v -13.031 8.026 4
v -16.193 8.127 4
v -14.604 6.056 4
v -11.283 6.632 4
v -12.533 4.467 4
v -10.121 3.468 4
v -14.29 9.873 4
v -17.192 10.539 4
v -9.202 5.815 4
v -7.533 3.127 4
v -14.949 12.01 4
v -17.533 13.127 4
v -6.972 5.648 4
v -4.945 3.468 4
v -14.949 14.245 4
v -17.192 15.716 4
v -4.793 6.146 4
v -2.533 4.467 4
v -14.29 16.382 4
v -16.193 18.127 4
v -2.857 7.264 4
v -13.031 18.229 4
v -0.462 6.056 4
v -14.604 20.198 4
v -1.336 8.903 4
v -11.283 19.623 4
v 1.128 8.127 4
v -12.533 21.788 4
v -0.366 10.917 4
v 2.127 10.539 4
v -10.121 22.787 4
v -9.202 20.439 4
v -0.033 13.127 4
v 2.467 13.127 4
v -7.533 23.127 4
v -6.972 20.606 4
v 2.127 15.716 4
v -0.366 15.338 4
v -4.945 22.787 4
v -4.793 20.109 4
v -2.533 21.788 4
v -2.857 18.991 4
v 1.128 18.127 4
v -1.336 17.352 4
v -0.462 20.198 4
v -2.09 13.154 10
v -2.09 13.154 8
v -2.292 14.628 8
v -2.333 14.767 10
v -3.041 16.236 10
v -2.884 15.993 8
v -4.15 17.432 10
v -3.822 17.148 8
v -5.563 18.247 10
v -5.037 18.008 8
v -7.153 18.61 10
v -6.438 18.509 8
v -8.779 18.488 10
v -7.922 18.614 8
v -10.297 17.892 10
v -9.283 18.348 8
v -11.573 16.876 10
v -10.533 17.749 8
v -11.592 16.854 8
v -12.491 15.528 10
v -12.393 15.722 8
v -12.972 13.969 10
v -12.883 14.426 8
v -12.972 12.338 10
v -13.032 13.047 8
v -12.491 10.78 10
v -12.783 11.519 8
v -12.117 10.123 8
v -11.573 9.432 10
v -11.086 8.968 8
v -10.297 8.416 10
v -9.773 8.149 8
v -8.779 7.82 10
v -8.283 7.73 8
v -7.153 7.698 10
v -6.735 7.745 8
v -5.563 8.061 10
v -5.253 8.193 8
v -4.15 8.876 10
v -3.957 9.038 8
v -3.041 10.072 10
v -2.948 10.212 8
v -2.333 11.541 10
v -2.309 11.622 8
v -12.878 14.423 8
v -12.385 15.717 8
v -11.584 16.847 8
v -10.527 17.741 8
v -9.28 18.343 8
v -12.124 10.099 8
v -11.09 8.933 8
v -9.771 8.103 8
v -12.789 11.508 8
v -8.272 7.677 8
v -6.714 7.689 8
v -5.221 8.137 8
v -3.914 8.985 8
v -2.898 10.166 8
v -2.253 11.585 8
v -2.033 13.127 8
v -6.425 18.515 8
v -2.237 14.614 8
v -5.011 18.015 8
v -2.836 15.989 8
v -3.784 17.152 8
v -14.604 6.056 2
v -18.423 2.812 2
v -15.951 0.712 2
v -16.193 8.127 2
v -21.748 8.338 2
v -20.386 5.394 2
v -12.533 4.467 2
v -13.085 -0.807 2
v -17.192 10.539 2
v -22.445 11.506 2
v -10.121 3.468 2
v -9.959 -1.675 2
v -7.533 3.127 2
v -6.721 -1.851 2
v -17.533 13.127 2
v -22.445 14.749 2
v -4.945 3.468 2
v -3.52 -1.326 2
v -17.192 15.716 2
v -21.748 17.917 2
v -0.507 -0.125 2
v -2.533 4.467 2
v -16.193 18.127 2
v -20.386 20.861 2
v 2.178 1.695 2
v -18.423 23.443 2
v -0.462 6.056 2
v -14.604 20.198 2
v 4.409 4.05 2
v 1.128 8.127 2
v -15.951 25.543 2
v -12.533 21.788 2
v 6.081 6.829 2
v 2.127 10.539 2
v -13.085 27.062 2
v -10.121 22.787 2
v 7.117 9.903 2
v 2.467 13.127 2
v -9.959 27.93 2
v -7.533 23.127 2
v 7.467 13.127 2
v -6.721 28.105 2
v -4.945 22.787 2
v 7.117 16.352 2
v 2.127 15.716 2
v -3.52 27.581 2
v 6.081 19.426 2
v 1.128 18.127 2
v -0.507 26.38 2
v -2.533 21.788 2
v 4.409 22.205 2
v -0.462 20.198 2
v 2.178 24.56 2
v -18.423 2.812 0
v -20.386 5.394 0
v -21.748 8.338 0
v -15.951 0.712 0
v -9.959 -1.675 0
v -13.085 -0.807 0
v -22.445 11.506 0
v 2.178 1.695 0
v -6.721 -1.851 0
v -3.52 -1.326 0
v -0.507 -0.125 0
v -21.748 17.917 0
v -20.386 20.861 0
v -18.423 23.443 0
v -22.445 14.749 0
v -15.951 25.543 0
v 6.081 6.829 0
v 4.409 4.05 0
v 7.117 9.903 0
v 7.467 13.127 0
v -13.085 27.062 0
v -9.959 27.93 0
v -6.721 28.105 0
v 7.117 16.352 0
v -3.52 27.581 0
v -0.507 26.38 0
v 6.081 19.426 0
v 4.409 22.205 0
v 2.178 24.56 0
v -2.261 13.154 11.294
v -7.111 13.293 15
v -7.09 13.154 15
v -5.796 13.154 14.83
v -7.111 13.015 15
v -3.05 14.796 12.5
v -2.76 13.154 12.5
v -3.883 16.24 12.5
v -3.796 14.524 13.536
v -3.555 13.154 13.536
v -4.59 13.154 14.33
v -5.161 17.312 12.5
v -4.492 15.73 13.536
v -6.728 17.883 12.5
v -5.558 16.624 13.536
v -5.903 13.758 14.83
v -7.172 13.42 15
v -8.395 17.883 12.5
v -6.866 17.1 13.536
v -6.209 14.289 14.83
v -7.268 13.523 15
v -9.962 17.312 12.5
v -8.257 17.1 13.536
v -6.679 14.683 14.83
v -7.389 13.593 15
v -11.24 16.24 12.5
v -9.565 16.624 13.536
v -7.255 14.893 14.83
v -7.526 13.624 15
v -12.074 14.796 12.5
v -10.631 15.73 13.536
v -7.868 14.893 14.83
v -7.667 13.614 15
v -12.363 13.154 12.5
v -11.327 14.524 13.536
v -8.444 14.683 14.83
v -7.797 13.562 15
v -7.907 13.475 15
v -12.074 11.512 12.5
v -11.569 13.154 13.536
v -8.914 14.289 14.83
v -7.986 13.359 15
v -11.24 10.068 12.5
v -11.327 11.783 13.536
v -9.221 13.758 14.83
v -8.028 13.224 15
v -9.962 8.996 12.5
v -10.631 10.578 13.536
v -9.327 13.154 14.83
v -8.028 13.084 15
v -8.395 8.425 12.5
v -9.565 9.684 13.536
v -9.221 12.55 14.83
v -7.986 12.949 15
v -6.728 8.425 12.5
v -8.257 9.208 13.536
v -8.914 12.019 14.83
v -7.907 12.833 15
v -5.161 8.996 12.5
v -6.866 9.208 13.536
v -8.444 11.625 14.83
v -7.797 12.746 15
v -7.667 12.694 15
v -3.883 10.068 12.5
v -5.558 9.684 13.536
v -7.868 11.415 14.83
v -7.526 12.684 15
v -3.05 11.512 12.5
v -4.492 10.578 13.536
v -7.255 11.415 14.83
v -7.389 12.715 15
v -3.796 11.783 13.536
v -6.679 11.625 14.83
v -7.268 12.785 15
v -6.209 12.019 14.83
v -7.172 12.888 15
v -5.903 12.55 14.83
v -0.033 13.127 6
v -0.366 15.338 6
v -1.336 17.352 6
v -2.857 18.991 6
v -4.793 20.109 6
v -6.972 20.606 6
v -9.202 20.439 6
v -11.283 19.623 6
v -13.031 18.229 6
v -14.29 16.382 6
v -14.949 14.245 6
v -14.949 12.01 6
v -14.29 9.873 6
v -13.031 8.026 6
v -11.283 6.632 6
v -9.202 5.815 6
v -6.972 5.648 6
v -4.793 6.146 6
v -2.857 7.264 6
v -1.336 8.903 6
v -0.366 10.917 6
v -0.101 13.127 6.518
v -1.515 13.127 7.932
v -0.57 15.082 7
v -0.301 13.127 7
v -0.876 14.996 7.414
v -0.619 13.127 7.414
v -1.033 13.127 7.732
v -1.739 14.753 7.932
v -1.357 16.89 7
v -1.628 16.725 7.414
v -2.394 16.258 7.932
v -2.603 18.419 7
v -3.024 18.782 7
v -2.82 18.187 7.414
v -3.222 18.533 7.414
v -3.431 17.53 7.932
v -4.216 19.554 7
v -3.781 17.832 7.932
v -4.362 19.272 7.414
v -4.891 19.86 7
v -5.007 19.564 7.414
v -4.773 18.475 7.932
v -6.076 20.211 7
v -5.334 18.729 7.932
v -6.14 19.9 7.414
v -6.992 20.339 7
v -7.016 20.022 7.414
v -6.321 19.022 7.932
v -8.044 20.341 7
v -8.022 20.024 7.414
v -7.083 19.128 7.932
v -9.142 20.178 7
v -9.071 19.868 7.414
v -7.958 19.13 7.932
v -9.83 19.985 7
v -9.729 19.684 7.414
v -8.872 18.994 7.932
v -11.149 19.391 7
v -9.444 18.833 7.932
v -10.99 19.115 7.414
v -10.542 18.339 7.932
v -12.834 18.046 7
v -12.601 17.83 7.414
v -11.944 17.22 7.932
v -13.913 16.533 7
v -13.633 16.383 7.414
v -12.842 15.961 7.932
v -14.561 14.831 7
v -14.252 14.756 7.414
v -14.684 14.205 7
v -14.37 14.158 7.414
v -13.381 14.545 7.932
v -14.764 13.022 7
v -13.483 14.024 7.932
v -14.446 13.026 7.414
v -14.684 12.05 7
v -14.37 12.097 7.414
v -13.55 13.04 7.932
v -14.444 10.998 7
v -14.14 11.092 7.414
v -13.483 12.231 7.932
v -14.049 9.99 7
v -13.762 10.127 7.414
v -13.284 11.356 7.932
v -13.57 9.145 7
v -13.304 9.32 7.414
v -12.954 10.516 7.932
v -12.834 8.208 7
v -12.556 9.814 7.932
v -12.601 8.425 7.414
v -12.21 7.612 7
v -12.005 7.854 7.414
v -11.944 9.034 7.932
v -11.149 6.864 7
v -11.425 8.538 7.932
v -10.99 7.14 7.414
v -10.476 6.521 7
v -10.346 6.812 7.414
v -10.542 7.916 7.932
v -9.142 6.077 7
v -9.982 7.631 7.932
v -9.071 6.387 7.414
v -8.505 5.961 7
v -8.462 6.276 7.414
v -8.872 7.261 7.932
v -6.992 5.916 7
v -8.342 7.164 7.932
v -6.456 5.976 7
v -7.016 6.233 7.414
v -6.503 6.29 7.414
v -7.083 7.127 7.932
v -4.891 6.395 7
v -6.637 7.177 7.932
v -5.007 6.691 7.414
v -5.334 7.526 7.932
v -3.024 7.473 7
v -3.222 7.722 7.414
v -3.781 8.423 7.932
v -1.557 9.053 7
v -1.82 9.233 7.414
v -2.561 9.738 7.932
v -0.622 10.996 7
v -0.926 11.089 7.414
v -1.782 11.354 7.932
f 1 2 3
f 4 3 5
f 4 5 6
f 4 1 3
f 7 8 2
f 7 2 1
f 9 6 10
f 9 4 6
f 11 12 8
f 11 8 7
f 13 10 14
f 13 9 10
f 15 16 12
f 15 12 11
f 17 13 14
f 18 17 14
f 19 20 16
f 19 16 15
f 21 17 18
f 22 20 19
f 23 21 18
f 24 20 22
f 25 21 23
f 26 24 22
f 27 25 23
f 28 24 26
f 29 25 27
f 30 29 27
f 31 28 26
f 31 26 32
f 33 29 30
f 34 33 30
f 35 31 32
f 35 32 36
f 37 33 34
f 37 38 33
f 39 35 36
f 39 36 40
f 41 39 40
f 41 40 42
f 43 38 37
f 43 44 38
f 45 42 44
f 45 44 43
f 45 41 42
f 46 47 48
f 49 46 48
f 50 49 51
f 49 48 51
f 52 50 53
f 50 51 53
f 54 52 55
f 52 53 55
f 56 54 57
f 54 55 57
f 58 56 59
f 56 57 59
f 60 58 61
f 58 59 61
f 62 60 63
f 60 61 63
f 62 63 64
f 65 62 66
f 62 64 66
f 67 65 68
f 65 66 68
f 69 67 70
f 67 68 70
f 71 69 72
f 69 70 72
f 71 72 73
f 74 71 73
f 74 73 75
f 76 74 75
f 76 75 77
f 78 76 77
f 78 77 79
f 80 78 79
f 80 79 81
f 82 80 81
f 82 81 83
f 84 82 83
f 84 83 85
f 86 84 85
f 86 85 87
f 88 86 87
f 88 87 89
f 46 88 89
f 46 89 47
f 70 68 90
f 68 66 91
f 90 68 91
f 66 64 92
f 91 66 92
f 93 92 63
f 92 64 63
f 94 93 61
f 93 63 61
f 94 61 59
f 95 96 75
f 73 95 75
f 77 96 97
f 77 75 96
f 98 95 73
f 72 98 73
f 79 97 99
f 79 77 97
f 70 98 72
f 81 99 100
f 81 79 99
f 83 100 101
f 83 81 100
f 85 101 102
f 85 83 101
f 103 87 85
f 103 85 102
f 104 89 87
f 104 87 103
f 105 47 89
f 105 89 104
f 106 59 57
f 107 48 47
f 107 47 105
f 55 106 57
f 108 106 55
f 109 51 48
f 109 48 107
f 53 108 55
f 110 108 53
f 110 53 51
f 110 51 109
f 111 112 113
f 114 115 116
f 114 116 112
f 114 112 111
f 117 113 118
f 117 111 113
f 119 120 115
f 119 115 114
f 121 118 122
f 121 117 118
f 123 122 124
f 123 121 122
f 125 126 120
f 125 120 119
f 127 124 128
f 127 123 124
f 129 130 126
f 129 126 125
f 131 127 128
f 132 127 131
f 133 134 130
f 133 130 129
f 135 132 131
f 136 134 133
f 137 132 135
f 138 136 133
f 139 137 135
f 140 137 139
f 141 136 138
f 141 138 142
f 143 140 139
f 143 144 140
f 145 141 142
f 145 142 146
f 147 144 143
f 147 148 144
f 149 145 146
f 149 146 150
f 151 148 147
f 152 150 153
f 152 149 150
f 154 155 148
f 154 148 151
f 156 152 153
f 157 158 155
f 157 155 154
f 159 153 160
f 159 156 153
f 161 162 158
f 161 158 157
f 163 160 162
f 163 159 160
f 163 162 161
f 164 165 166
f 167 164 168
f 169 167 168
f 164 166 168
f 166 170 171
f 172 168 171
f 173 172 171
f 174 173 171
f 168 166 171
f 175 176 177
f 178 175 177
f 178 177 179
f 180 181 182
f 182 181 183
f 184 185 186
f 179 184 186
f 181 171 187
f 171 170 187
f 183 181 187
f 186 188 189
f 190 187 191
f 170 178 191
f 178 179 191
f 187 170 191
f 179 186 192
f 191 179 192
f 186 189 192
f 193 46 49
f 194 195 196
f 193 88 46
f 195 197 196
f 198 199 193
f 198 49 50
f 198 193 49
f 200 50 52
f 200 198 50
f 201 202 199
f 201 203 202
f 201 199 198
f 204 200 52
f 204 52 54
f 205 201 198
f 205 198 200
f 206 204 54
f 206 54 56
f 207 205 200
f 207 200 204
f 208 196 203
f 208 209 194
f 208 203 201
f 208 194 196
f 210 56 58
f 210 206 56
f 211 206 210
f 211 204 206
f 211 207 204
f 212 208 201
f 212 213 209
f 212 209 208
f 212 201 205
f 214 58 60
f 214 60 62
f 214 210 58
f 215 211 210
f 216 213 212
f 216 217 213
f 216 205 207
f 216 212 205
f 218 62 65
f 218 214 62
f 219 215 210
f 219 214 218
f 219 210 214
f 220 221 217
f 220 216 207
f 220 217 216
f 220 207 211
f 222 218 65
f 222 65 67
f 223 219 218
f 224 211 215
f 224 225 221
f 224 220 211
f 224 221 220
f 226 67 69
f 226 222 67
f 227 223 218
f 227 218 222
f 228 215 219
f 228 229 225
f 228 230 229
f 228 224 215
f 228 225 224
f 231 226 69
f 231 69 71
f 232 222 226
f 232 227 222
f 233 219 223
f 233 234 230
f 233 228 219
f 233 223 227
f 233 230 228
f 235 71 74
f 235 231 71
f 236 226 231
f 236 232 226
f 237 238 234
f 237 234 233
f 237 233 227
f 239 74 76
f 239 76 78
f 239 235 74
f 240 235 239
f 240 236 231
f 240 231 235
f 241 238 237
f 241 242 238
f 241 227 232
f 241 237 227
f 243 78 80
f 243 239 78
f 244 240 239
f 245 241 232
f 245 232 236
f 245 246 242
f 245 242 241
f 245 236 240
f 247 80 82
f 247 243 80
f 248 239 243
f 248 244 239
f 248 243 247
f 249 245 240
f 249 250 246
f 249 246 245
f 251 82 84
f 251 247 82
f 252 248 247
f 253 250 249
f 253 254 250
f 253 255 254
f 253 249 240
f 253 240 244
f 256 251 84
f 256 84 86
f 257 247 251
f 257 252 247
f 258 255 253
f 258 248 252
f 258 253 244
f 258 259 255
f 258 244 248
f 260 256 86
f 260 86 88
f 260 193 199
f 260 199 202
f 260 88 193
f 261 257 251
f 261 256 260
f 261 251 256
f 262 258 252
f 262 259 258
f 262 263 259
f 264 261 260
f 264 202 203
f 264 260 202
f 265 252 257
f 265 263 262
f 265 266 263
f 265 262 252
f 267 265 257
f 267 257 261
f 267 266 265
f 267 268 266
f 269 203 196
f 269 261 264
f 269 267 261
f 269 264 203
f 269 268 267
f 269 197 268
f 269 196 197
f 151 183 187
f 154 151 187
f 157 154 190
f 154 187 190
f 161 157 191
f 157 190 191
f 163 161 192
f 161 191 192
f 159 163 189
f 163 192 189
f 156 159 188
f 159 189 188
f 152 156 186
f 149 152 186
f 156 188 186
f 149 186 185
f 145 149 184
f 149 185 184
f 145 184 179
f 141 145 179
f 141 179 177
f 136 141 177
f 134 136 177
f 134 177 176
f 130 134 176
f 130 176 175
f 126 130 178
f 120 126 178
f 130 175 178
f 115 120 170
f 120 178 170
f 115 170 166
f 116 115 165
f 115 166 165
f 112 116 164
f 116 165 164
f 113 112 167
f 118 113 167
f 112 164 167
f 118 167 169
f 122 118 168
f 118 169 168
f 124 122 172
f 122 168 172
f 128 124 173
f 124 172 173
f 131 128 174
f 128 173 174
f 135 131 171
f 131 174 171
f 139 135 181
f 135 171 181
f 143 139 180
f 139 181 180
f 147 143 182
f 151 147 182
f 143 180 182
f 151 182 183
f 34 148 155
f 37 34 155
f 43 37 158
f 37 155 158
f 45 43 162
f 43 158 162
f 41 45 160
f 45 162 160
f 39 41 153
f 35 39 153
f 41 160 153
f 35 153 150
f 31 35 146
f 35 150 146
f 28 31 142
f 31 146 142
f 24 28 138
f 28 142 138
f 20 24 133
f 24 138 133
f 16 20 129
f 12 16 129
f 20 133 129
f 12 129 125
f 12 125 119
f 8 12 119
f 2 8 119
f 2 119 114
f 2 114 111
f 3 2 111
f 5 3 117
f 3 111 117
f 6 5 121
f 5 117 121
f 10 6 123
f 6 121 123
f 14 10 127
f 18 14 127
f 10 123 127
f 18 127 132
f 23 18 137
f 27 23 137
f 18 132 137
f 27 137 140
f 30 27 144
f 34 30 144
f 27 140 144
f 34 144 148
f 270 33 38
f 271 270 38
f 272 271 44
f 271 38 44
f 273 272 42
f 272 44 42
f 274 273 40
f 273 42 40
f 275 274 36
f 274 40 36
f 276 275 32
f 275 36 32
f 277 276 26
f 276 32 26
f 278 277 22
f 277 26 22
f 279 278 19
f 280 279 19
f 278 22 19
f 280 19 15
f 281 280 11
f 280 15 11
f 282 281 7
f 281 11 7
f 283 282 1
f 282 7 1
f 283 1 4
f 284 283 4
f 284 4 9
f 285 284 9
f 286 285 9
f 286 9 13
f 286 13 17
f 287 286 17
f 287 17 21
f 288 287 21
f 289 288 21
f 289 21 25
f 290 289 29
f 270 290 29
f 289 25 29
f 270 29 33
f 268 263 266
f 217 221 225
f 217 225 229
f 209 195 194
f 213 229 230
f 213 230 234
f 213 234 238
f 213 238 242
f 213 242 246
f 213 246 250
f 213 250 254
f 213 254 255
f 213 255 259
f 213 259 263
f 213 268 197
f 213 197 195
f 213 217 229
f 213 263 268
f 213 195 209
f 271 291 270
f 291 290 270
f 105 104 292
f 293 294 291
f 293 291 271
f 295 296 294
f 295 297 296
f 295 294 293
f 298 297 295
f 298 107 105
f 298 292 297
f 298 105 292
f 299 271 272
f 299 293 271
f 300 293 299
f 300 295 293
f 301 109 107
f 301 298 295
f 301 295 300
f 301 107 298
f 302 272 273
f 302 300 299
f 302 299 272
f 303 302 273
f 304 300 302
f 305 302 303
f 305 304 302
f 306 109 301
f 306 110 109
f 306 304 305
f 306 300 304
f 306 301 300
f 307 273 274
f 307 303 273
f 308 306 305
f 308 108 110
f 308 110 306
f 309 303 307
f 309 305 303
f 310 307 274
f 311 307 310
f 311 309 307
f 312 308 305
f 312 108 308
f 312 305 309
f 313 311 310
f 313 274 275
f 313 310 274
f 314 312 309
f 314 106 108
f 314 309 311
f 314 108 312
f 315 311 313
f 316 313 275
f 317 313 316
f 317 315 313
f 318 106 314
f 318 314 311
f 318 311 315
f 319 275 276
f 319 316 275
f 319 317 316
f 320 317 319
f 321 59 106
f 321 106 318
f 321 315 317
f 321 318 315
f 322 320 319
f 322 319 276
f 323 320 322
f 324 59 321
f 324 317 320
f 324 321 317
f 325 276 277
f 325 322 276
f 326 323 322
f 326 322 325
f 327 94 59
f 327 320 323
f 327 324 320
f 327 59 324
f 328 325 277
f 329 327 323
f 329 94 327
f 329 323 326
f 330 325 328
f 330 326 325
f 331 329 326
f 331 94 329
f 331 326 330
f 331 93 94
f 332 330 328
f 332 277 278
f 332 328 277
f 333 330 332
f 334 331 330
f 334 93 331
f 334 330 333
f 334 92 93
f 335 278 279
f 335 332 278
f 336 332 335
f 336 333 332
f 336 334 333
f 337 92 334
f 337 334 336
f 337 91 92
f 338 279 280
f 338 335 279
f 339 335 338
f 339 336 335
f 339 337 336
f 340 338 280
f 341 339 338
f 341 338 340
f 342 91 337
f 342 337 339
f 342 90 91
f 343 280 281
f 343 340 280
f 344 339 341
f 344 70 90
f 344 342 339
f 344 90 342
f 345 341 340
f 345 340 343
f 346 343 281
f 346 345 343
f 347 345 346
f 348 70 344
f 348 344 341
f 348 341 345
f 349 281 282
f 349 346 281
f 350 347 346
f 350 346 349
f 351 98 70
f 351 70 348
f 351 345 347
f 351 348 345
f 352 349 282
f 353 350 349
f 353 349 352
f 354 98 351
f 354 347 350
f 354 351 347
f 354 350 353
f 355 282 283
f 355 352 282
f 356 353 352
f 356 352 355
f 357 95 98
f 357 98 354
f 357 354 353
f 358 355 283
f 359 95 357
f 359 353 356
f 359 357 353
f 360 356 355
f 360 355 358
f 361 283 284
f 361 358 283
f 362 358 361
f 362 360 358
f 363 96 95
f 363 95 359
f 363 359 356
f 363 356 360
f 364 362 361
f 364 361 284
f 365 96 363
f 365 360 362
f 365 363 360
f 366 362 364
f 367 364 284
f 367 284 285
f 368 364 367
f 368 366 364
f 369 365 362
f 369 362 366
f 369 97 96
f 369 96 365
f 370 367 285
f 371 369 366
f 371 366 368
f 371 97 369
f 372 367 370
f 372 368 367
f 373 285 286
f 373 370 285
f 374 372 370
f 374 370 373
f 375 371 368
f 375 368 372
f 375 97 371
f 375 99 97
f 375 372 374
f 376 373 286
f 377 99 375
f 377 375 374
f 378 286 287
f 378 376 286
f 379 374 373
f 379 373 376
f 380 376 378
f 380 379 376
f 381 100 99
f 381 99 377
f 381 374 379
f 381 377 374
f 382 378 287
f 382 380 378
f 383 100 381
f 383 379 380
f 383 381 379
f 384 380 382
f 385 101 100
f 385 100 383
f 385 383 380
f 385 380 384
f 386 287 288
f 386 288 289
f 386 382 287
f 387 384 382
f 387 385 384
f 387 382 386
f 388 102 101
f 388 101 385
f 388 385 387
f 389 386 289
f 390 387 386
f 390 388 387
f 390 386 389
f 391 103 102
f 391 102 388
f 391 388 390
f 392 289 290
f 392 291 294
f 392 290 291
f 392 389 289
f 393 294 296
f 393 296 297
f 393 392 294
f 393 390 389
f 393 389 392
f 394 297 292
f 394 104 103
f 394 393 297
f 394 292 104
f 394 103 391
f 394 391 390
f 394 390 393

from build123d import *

# Parameters (mm, degrees)
SKETCH1_R           = 15
BOSS_EXTRUDE1_DEPTH = 2
SKETCH2_R           = 10
BOSS_EXTRUDE2_DEPTH = 2
SKETCH3_R           = 7.5
BOSS_EXTRUDE3_DEPTH = 4
FILLET1_R           = 2
SKETCH4_R           = 5.471529996
BOSS_EXTRUDE4_DEPTH = 7
FILLET2_R           = 5


with BuildPart() as part:
    # Sketch1 → Boss-Extrude1 (new body)
    with BuildSketch(Plane.XY):
        with Locations((-7.532732603, 13.127432061)):
            Circle(SKETCH1_R)
    extrude(amount=BOSS_EXTRUDE1_DEPTH)

    # Sketch2 → Boss-Extrude2 (add)
    with BuildSketch(Plane.XY.offset(2)):
        with Locations((-7.532732603, 13.127432061)):
            Circle(SKETCH2_R)
    extrude(amount=BOSS_EXTRUDE2_DEPTH)

    # Sketch3 → Boss-Extrude3 (add)
    with BuildSketch(Plane.XY.offset(4)):
        with Locations((-7.532732603, 13.127432061)):
            Circle(SKETCH3_R)
    extrude(amount=BOSS_EXTRUDE3_DEPTH)

    # Fillet1
    fillet1_edges = [part.edges().sort_by_distance(p)[0] for p in [
        (-15.032732603, 13.127432061, 8),
    ]]
    fillet(fillet1_edges, radius=FILLET1_R)

    # Sketch4 → Boss-Extrude4 (add)
    with BuildSketch(Plane.XY.offset(8)):
        with Locations((-7.561660228, 13.153988569)):
            Circle(SKETCH4_R)
    extrude(amount=BOSS_EXTRUDE4_DEPTH)

    # Fillet2
    fillet2_edges = [part.edges().sort_by_distance(p)[0] for p in [
        (-13.033190224, 13.153988569, 15),
    ]]
    fillet(fillet2_edges, radius=FILLET2_R)


solid = part.part
